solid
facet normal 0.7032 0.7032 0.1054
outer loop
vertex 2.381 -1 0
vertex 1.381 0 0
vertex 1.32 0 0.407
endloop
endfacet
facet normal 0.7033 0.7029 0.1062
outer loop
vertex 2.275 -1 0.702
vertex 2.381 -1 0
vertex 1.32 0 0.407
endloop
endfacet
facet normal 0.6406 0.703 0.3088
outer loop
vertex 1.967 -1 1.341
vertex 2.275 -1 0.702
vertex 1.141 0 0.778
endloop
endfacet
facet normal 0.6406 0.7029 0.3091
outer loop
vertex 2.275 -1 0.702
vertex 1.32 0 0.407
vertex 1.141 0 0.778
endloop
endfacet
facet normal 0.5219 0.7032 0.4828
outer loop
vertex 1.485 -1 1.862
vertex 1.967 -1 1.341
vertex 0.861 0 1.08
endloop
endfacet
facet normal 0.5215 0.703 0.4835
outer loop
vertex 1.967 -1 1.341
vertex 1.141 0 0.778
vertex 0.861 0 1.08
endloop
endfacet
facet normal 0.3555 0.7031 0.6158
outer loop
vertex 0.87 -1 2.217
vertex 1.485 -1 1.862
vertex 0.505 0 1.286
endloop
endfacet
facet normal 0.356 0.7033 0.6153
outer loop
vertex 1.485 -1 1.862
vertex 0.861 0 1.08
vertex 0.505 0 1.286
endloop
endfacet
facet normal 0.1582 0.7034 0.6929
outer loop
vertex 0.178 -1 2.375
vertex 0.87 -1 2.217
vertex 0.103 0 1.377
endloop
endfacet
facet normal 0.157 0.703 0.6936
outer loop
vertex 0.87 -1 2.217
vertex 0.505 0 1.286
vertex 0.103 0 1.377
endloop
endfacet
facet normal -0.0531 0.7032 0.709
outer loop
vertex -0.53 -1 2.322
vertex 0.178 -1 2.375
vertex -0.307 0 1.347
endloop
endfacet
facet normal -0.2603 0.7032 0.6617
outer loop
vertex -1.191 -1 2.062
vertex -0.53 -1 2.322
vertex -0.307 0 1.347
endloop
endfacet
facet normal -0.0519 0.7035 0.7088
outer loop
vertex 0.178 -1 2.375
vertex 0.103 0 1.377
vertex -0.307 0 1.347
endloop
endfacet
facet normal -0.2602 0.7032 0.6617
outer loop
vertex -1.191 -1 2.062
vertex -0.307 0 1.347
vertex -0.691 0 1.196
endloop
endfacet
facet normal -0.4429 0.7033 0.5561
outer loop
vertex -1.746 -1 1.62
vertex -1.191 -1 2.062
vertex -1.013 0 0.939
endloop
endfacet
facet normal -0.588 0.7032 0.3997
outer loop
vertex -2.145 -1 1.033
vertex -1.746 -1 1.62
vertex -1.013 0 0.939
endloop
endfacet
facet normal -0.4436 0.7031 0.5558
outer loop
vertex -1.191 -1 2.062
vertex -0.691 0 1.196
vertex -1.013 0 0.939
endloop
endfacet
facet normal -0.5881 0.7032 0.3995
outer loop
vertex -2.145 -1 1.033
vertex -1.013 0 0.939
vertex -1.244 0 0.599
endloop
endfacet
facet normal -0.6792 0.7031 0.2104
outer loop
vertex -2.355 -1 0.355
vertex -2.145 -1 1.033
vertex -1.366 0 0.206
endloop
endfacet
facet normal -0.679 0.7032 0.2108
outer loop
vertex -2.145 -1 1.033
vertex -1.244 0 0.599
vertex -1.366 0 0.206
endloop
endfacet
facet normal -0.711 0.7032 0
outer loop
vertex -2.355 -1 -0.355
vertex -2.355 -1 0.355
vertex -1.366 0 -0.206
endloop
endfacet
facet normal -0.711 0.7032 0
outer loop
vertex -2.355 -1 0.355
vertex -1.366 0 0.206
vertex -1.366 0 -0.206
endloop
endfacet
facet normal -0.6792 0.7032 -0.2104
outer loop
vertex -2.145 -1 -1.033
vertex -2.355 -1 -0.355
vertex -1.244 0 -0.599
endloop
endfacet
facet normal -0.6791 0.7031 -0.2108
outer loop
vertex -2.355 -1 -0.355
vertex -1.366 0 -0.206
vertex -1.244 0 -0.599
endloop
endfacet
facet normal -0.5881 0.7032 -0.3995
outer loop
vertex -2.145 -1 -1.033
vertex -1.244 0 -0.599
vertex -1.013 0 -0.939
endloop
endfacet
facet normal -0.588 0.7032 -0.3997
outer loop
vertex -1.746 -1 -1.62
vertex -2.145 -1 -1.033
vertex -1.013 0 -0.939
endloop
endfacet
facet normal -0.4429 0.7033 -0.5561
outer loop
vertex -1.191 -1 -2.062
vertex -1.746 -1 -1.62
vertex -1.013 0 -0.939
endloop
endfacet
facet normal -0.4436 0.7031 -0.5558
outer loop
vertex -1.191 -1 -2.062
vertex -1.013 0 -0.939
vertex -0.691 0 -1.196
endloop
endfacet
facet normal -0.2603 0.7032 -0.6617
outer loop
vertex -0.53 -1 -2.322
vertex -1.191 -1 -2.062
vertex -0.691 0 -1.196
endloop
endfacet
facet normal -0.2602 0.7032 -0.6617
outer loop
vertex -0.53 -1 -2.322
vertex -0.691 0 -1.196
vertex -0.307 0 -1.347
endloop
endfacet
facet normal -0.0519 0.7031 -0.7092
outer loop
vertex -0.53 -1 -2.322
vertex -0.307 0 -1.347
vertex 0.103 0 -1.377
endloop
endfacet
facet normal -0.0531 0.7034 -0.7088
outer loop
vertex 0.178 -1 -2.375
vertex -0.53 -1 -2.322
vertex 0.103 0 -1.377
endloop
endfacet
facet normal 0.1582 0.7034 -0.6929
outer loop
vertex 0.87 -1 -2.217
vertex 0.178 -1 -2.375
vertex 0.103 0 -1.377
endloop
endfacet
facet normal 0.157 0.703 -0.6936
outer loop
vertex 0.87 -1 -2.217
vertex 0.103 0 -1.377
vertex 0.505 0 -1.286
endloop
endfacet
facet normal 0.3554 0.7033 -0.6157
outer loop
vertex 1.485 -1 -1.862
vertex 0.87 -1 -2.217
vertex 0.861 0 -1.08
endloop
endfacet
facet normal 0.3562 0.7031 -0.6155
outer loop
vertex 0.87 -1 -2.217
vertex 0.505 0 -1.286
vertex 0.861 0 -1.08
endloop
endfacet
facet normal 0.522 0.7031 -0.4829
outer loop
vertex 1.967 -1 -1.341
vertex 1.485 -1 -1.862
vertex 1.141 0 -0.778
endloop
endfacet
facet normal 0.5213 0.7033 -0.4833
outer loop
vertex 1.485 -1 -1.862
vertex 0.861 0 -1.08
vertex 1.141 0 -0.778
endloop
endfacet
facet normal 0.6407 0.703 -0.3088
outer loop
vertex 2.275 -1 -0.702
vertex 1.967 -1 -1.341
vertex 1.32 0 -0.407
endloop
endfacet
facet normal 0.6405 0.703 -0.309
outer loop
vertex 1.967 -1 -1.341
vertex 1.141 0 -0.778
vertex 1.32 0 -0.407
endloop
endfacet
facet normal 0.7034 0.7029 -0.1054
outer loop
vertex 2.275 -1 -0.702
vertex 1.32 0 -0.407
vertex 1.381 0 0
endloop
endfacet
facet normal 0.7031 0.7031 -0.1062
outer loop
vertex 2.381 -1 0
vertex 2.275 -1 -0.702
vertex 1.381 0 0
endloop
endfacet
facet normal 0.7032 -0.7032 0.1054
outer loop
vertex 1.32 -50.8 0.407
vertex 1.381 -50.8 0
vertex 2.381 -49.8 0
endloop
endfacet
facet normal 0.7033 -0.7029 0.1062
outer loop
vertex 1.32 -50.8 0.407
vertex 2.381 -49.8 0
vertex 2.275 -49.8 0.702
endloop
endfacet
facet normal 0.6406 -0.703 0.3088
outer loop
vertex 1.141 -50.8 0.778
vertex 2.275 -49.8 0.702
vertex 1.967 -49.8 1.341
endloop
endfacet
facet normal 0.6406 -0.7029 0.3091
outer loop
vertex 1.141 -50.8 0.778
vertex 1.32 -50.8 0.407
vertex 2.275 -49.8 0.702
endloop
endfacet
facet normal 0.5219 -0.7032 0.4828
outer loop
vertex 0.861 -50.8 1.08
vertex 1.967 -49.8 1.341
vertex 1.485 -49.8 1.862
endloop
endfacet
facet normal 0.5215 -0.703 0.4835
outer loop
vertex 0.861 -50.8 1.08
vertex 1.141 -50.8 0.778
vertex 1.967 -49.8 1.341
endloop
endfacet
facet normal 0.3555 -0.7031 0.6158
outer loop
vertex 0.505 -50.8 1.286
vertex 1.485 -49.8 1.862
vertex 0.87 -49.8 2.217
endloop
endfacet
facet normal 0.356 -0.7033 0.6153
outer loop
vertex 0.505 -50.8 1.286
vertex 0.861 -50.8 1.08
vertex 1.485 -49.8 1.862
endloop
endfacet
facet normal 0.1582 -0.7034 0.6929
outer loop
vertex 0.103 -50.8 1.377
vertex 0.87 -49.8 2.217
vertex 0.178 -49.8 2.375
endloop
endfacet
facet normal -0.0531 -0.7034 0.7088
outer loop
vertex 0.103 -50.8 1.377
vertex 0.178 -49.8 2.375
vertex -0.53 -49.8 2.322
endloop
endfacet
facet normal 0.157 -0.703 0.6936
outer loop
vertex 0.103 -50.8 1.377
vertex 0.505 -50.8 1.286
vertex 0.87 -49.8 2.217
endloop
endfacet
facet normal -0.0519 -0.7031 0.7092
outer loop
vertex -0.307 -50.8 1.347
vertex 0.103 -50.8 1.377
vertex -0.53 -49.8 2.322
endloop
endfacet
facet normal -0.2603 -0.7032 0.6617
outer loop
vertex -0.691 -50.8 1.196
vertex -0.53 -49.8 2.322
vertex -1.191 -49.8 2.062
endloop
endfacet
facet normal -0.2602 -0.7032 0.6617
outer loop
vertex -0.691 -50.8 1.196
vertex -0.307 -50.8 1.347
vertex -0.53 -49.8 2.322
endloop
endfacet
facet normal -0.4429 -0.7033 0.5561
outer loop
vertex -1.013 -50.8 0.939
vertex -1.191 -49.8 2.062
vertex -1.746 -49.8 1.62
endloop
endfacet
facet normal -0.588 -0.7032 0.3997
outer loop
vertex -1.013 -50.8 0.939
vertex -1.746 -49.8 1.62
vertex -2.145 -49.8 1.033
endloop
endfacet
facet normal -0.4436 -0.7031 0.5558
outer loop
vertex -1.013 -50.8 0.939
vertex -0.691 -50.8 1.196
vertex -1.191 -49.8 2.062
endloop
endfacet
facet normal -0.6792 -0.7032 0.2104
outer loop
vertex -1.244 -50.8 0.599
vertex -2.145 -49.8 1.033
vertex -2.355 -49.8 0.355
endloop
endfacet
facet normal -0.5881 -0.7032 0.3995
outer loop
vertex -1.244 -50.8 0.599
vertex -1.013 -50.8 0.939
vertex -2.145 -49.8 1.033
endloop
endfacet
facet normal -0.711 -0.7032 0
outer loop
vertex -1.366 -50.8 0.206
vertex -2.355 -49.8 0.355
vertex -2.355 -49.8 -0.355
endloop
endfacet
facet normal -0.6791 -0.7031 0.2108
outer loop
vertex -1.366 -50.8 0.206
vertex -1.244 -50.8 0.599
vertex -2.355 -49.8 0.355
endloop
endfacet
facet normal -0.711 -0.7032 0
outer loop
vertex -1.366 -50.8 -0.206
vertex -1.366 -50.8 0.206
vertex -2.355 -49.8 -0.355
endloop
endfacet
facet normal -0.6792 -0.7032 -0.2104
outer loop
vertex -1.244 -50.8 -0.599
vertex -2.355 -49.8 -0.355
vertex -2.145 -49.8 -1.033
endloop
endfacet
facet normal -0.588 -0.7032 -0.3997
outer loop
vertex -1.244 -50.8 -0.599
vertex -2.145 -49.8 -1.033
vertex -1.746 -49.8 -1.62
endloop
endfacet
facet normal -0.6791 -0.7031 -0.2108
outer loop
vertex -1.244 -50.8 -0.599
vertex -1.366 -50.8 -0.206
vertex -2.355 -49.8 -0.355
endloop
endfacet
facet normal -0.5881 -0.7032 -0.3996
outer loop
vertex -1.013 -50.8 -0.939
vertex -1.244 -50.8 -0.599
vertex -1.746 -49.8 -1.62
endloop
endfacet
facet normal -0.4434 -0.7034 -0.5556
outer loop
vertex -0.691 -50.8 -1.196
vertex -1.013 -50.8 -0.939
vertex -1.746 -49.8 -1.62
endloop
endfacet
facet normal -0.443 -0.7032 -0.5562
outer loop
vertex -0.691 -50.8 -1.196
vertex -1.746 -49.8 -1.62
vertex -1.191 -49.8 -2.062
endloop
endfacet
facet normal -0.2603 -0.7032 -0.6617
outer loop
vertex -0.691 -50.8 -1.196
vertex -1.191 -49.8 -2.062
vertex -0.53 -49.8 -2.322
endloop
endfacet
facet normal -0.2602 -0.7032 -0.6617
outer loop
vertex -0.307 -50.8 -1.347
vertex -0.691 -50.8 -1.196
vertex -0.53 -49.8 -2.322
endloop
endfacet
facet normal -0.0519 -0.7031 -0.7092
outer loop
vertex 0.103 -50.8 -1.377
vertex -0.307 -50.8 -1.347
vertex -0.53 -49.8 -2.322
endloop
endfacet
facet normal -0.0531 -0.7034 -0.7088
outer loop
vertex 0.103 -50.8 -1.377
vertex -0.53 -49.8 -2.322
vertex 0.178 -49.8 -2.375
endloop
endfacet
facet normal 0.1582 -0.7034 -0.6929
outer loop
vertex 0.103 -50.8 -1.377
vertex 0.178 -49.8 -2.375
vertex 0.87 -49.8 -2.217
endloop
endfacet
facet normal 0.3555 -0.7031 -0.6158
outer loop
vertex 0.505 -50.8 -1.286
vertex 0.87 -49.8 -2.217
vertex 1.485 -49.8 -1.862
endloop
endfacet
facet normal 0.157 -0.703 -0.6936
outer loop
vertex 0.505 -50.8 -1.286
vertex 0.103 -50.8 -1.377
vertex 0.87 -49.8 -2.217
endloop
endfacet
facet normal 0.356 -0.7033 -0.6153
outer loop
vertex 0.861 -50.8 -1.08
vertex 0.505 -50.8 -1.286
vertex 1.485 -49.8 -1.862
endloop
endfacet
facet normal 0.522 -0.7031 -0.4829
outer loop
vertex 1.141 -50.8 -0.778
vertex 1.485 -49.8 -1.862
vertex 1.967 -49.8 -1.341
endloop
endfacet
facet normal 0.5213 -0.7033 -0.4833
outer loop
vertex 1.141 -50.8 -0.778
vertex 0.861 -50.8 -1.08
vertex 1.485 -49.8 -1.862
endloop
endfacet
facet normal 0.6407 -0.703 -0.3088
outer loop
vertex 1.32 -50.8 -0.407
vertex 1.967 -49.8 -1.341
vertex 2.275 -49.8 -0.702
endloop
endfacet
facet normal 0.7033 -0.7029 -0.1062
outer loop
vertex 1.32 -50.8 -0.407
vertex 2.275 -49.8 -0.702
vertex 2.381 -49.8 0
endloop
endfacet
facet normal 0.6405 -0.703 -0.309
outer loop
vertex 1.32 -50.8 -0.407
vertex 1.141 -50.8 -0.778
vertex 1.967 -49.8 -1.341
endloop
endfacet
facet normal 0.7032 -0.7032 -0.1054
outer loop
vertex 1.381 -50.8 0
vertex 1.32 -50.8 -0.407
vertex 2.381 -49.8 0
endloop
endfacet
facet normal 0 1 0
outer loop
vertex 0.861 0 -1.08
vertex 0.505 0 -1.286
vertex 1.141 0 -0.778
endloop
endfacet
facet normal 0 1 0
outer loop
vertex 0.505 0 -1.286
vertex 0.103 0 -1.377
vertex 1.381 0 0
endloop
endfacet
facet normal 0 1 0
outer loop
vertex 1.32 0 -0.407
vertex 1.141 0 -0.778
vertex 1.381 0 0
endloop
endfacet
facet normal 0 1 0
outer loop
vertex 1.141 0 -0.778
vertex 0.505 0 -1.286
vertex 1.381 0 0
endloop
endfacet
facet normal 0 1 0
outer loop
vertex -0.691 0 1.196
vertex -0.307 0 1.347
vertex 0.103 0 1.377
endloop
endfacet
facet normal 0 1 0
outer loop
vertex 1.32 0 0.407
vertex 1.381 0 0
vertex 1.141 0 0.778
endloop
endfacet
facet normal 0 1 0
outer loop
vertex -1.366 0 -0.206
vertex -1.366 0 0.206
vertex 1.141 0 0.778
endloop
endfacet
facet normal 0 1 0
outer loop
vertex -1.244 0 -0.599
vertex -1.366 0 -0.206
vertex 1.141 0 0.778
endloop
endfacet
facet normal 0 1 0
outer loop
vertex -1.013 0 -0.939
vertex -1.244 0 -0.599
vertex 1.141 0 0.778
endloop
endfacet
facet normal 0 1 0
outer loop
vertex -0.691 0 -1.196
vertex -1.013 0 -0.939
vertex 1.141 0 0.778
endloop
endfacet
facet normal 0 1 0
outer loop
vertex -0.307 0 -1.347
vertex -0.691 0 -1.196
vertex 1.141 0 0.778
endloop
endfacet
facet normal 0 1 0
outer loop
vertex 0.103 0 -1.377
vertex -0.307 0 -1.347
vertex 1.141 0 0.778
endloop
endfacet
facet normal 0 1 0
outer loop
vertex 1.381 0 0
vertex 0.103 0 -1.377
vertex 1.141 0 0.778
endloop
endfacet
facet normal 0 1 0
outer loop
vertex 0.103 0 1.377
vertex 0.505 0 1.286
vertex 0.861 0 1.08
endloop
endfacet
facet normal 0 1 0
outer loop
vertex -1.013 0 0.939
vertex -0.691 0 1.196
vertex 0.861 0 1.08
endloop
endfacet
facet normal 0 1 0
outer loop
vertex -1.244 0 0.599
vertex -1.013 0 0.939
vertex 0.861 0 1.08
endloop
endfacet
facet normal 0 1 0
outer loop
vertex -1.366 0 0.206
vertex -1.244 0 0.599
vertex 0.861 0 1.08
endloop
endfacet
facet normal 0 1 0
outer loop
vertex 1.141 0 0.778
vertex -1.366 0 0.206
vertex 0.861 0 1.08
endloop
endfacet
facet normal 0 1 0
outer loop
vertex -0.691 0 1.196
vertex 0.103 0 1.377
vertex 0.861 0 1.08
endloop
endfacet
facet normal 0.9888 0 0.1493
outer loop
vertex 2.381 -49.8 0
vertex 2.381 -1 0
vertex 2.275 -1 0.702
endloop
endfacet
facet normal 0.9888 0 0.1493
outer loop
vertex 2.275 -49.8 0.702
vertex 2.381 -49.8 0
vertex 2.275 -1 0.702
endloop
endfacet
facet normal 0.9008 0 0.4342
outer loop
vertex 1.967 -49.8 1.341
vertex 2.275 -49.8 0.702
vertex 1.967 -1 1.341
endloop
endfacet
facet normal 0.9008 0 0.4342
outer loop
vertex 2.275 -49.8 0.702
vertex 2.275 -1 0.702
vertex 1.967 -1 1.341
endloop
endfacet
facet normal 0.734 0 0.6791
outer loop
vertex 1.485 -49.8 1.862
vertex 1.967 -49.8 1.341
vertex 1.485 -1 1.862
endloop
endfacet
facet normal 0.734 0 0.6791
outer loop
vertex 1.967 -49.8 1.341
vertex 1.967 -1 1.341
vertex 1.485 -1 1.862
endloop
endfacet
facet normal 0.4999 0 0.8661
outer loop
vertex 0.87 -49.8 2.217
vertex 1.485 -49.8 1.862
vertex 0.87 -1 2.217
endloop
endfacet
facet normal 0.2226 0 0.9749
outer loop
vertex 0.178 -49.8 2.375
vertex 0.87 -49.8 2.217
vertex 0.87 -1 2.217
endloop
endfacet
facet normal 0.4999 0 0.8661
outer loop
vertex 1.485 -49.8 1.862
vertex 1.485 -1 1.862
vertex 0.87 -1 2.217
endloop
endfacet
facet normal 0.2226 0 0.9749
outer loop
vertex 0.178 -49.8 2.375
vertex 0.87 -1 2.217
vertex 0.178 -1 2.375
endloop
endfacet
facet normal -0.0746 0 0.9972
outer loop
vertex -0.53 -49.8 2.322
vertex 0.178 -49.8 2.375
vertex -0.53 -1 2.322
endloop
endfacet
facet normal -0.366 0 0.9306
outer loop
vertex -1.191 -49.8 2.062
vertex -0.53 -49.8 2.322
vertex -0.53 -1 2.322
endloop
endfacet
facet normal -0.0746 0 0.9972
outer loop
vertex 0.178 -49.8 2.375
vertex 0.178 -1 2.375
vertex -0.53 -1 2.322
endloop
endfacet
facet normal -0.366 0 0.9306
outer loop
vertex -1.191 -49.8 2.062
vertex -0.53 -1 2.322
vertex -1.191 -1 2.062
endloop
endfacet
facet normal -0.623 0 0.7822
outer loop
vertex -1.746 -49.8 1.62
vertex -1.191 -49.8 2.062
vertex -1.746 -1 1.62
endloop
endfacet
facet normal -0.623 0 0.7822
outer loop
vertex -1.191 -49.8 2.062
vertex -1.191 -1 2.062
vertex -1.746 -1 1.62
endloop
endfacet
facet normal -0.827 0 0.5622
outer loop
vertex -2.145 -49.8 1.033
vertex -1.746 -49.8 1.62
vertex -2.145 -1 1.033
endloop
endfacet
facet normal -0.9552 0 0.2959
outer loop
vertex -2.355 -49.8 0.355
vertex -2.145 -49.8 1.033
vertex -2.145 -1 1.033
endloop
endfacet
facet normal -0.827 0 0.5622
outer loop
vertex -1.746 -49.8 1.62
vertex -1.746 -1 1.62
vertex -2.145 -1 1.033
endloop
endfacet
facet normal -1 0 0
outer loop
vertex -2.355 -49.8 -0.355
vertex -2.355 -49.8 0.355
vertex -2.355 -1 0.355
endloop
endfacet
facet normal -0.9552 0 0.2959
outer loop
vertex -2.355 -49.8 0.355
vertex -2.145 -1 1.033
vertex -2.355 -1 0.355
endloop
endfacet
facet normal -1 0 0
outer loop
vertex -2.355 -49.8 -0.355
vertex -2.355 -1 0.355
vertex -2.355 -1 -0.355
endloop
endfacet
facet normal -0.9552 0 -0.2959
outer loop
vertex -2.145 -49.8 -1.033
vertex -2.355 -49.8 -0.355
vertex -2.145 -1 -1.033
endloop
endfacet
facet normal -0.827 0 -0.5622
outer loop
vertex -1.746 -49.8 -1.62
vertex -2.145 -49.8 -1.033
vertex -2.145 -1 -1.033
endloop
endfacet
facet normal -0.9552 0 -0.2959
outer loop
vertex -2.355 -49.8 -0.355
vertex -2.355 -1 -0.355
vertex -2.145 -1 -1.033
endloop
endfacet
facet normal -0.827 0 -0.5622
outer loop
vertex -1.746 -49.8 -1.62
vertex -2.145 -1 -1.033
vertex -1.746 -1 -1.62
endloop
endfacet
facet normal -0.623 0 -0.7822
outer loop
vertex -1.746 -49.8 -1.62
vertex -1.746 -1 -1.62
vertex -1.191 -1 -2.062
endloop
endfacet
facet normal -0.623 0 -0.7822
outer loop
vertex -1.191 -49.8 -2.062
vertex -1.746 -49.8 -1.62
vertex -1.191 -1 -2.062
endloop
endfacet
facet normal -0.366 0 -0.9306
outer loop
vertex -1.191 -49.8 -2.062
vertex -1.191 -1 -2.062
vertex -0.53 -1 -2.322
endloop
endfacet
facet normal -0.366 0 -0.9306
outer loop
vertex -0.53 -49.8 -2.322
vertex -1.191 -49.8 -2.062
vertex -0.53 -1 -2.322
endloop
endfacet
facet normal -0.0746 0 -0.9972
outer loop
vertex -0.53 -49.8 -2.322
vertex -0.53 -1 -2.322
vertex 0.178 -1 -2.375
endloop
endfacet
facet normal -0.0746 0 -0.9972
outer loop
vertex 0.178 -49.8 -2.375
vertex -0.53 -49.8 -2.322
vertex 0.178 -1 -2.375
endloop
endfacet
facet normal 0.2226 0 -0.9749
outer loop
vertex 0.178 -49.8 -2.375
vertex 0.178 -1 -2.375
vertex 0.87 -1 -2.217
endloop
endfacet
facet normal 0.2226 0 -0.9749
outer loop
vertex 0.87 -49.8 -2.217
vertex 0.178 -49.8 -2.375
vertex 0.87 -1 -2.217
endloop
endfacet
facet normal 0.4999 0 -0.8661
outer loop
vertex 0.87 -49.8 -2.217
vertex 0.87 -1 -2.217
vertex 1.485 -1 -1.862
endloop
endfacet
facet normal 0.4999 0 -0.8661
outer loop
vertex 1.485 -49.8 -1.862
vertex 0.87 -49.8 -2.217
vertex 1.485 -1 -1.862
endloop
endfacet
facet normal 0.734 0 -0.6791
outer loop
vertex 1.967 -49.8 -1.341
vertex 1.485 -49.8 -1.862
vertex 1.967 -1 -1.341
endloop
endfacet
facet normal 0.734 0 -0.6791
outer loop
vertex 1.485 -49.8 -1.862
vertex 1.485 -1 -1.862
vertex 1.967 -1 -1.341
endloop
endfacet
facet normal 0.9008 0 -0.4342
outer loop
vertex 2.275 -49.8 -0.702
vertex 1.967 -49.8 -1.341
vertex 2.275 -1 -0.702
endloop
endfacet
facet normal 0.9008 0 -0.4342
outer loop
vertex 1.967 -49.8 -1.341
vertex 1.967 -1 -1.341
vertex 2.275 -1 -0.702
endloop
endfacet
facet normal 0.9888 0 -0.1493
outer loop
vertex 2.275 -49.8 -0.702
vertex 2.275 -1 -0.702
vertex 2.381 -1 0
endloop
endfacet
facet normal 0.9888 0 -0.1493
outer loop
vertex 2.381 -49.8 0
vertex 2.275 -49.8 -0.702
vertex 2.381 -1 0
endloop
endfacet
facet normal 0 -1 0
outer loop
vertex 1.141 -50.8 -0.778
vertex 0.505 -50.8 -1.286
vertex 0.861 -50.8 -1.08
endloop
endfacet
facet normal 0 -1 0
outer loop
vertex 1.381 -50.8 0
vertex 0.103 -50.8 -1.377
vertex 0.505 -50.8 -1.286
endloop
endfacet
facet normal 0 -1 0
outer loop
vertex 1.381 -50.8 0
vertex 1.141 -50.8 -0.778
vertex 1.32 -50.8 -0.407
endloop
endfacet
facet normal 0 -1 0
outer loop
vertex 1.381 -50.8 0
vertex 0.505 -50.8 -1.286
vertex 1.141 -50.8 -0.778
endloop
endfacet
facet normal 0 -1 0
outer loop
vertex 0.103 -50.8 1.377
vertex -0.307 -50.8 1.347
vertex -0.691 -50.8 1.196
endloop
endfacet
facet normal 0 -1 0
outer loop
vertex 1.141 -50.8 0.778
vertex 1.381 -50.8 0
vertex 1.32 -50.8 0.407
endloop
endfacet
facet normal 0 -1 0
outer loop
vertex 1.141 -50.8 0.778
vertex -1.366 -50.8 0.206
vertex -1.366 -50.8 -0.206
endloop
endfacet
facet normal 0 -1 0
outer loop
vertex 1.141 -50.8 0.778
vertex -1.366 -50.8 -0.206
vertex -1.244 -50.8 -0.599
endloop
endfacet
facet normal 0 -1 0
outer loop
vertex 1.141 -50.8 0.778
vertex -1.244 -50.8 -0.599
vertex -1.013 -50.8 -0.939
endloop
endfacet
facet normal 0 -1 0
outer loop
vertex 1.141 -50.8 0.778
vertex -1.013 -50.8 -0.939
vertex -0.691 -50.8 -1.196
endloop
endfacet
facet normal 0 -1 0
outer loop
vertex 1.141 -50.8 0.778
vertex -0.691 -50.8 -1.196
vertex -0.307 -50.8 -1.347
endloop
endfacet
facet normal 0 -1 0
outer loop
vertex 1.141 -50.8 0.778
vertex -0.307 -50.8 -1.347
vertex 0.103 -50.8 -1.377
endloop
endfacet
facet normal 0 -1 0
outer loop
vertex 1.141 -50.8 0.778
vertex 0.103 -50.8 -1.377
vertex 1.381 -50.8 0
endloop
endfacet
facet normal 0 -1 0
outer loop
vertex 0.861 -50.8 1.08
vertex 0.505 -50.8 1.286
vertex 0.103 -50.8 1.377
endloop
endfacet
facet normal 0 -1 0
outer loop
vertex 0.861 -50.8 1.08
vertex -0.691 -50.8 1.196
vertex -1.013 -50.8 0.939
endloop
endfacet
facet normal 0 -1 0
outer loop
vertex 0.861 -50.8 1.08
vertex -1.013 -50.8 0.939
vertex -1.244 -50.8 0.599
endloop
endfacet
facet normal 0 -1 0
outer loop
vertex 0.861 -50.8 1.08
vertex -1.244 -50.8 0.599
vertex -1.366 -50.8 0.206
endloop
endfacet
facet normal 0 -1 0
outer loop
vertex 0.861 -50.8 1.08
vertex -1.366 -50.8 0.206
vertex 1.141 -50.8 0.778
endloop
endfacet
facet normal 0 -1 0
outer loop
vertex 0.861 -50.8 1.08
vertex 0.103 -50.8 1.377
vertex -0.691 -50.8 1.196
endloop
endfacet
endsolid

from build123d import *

# Parameters (mm, degrees)
SKETCH040_R     = 2.38125
PAD011_DEPTH    = 50.8
CHAMFER_SIZE    = 1
CHAMFER001_SIZE = 1


with BuildPart() as part:
    # Sketch040 → Pad011 (new body)
    with BuildSketch(Plane.XZ):
        Circle(SKETCH040_R)
    extrude(amount=PAD011_DEPTH)

    # Chamfer
    chamfer_edges = [part.edges().sort_by_distance(p)[0] for p in [
        (-2.38125, -50.8, 0),
    ]]
    chamfer(chamfer_edges, length=CHAMFER_SIZE)

    # Chamfer001
    chamfer001_edges = [part.edges().sort_by_distance(p)[0] for p in [
        (-2.38125, 0, 0),
    ]]
    chamfer(chamfer001_edges, length=CHAMFER001_SIZE)


solid = part.part
